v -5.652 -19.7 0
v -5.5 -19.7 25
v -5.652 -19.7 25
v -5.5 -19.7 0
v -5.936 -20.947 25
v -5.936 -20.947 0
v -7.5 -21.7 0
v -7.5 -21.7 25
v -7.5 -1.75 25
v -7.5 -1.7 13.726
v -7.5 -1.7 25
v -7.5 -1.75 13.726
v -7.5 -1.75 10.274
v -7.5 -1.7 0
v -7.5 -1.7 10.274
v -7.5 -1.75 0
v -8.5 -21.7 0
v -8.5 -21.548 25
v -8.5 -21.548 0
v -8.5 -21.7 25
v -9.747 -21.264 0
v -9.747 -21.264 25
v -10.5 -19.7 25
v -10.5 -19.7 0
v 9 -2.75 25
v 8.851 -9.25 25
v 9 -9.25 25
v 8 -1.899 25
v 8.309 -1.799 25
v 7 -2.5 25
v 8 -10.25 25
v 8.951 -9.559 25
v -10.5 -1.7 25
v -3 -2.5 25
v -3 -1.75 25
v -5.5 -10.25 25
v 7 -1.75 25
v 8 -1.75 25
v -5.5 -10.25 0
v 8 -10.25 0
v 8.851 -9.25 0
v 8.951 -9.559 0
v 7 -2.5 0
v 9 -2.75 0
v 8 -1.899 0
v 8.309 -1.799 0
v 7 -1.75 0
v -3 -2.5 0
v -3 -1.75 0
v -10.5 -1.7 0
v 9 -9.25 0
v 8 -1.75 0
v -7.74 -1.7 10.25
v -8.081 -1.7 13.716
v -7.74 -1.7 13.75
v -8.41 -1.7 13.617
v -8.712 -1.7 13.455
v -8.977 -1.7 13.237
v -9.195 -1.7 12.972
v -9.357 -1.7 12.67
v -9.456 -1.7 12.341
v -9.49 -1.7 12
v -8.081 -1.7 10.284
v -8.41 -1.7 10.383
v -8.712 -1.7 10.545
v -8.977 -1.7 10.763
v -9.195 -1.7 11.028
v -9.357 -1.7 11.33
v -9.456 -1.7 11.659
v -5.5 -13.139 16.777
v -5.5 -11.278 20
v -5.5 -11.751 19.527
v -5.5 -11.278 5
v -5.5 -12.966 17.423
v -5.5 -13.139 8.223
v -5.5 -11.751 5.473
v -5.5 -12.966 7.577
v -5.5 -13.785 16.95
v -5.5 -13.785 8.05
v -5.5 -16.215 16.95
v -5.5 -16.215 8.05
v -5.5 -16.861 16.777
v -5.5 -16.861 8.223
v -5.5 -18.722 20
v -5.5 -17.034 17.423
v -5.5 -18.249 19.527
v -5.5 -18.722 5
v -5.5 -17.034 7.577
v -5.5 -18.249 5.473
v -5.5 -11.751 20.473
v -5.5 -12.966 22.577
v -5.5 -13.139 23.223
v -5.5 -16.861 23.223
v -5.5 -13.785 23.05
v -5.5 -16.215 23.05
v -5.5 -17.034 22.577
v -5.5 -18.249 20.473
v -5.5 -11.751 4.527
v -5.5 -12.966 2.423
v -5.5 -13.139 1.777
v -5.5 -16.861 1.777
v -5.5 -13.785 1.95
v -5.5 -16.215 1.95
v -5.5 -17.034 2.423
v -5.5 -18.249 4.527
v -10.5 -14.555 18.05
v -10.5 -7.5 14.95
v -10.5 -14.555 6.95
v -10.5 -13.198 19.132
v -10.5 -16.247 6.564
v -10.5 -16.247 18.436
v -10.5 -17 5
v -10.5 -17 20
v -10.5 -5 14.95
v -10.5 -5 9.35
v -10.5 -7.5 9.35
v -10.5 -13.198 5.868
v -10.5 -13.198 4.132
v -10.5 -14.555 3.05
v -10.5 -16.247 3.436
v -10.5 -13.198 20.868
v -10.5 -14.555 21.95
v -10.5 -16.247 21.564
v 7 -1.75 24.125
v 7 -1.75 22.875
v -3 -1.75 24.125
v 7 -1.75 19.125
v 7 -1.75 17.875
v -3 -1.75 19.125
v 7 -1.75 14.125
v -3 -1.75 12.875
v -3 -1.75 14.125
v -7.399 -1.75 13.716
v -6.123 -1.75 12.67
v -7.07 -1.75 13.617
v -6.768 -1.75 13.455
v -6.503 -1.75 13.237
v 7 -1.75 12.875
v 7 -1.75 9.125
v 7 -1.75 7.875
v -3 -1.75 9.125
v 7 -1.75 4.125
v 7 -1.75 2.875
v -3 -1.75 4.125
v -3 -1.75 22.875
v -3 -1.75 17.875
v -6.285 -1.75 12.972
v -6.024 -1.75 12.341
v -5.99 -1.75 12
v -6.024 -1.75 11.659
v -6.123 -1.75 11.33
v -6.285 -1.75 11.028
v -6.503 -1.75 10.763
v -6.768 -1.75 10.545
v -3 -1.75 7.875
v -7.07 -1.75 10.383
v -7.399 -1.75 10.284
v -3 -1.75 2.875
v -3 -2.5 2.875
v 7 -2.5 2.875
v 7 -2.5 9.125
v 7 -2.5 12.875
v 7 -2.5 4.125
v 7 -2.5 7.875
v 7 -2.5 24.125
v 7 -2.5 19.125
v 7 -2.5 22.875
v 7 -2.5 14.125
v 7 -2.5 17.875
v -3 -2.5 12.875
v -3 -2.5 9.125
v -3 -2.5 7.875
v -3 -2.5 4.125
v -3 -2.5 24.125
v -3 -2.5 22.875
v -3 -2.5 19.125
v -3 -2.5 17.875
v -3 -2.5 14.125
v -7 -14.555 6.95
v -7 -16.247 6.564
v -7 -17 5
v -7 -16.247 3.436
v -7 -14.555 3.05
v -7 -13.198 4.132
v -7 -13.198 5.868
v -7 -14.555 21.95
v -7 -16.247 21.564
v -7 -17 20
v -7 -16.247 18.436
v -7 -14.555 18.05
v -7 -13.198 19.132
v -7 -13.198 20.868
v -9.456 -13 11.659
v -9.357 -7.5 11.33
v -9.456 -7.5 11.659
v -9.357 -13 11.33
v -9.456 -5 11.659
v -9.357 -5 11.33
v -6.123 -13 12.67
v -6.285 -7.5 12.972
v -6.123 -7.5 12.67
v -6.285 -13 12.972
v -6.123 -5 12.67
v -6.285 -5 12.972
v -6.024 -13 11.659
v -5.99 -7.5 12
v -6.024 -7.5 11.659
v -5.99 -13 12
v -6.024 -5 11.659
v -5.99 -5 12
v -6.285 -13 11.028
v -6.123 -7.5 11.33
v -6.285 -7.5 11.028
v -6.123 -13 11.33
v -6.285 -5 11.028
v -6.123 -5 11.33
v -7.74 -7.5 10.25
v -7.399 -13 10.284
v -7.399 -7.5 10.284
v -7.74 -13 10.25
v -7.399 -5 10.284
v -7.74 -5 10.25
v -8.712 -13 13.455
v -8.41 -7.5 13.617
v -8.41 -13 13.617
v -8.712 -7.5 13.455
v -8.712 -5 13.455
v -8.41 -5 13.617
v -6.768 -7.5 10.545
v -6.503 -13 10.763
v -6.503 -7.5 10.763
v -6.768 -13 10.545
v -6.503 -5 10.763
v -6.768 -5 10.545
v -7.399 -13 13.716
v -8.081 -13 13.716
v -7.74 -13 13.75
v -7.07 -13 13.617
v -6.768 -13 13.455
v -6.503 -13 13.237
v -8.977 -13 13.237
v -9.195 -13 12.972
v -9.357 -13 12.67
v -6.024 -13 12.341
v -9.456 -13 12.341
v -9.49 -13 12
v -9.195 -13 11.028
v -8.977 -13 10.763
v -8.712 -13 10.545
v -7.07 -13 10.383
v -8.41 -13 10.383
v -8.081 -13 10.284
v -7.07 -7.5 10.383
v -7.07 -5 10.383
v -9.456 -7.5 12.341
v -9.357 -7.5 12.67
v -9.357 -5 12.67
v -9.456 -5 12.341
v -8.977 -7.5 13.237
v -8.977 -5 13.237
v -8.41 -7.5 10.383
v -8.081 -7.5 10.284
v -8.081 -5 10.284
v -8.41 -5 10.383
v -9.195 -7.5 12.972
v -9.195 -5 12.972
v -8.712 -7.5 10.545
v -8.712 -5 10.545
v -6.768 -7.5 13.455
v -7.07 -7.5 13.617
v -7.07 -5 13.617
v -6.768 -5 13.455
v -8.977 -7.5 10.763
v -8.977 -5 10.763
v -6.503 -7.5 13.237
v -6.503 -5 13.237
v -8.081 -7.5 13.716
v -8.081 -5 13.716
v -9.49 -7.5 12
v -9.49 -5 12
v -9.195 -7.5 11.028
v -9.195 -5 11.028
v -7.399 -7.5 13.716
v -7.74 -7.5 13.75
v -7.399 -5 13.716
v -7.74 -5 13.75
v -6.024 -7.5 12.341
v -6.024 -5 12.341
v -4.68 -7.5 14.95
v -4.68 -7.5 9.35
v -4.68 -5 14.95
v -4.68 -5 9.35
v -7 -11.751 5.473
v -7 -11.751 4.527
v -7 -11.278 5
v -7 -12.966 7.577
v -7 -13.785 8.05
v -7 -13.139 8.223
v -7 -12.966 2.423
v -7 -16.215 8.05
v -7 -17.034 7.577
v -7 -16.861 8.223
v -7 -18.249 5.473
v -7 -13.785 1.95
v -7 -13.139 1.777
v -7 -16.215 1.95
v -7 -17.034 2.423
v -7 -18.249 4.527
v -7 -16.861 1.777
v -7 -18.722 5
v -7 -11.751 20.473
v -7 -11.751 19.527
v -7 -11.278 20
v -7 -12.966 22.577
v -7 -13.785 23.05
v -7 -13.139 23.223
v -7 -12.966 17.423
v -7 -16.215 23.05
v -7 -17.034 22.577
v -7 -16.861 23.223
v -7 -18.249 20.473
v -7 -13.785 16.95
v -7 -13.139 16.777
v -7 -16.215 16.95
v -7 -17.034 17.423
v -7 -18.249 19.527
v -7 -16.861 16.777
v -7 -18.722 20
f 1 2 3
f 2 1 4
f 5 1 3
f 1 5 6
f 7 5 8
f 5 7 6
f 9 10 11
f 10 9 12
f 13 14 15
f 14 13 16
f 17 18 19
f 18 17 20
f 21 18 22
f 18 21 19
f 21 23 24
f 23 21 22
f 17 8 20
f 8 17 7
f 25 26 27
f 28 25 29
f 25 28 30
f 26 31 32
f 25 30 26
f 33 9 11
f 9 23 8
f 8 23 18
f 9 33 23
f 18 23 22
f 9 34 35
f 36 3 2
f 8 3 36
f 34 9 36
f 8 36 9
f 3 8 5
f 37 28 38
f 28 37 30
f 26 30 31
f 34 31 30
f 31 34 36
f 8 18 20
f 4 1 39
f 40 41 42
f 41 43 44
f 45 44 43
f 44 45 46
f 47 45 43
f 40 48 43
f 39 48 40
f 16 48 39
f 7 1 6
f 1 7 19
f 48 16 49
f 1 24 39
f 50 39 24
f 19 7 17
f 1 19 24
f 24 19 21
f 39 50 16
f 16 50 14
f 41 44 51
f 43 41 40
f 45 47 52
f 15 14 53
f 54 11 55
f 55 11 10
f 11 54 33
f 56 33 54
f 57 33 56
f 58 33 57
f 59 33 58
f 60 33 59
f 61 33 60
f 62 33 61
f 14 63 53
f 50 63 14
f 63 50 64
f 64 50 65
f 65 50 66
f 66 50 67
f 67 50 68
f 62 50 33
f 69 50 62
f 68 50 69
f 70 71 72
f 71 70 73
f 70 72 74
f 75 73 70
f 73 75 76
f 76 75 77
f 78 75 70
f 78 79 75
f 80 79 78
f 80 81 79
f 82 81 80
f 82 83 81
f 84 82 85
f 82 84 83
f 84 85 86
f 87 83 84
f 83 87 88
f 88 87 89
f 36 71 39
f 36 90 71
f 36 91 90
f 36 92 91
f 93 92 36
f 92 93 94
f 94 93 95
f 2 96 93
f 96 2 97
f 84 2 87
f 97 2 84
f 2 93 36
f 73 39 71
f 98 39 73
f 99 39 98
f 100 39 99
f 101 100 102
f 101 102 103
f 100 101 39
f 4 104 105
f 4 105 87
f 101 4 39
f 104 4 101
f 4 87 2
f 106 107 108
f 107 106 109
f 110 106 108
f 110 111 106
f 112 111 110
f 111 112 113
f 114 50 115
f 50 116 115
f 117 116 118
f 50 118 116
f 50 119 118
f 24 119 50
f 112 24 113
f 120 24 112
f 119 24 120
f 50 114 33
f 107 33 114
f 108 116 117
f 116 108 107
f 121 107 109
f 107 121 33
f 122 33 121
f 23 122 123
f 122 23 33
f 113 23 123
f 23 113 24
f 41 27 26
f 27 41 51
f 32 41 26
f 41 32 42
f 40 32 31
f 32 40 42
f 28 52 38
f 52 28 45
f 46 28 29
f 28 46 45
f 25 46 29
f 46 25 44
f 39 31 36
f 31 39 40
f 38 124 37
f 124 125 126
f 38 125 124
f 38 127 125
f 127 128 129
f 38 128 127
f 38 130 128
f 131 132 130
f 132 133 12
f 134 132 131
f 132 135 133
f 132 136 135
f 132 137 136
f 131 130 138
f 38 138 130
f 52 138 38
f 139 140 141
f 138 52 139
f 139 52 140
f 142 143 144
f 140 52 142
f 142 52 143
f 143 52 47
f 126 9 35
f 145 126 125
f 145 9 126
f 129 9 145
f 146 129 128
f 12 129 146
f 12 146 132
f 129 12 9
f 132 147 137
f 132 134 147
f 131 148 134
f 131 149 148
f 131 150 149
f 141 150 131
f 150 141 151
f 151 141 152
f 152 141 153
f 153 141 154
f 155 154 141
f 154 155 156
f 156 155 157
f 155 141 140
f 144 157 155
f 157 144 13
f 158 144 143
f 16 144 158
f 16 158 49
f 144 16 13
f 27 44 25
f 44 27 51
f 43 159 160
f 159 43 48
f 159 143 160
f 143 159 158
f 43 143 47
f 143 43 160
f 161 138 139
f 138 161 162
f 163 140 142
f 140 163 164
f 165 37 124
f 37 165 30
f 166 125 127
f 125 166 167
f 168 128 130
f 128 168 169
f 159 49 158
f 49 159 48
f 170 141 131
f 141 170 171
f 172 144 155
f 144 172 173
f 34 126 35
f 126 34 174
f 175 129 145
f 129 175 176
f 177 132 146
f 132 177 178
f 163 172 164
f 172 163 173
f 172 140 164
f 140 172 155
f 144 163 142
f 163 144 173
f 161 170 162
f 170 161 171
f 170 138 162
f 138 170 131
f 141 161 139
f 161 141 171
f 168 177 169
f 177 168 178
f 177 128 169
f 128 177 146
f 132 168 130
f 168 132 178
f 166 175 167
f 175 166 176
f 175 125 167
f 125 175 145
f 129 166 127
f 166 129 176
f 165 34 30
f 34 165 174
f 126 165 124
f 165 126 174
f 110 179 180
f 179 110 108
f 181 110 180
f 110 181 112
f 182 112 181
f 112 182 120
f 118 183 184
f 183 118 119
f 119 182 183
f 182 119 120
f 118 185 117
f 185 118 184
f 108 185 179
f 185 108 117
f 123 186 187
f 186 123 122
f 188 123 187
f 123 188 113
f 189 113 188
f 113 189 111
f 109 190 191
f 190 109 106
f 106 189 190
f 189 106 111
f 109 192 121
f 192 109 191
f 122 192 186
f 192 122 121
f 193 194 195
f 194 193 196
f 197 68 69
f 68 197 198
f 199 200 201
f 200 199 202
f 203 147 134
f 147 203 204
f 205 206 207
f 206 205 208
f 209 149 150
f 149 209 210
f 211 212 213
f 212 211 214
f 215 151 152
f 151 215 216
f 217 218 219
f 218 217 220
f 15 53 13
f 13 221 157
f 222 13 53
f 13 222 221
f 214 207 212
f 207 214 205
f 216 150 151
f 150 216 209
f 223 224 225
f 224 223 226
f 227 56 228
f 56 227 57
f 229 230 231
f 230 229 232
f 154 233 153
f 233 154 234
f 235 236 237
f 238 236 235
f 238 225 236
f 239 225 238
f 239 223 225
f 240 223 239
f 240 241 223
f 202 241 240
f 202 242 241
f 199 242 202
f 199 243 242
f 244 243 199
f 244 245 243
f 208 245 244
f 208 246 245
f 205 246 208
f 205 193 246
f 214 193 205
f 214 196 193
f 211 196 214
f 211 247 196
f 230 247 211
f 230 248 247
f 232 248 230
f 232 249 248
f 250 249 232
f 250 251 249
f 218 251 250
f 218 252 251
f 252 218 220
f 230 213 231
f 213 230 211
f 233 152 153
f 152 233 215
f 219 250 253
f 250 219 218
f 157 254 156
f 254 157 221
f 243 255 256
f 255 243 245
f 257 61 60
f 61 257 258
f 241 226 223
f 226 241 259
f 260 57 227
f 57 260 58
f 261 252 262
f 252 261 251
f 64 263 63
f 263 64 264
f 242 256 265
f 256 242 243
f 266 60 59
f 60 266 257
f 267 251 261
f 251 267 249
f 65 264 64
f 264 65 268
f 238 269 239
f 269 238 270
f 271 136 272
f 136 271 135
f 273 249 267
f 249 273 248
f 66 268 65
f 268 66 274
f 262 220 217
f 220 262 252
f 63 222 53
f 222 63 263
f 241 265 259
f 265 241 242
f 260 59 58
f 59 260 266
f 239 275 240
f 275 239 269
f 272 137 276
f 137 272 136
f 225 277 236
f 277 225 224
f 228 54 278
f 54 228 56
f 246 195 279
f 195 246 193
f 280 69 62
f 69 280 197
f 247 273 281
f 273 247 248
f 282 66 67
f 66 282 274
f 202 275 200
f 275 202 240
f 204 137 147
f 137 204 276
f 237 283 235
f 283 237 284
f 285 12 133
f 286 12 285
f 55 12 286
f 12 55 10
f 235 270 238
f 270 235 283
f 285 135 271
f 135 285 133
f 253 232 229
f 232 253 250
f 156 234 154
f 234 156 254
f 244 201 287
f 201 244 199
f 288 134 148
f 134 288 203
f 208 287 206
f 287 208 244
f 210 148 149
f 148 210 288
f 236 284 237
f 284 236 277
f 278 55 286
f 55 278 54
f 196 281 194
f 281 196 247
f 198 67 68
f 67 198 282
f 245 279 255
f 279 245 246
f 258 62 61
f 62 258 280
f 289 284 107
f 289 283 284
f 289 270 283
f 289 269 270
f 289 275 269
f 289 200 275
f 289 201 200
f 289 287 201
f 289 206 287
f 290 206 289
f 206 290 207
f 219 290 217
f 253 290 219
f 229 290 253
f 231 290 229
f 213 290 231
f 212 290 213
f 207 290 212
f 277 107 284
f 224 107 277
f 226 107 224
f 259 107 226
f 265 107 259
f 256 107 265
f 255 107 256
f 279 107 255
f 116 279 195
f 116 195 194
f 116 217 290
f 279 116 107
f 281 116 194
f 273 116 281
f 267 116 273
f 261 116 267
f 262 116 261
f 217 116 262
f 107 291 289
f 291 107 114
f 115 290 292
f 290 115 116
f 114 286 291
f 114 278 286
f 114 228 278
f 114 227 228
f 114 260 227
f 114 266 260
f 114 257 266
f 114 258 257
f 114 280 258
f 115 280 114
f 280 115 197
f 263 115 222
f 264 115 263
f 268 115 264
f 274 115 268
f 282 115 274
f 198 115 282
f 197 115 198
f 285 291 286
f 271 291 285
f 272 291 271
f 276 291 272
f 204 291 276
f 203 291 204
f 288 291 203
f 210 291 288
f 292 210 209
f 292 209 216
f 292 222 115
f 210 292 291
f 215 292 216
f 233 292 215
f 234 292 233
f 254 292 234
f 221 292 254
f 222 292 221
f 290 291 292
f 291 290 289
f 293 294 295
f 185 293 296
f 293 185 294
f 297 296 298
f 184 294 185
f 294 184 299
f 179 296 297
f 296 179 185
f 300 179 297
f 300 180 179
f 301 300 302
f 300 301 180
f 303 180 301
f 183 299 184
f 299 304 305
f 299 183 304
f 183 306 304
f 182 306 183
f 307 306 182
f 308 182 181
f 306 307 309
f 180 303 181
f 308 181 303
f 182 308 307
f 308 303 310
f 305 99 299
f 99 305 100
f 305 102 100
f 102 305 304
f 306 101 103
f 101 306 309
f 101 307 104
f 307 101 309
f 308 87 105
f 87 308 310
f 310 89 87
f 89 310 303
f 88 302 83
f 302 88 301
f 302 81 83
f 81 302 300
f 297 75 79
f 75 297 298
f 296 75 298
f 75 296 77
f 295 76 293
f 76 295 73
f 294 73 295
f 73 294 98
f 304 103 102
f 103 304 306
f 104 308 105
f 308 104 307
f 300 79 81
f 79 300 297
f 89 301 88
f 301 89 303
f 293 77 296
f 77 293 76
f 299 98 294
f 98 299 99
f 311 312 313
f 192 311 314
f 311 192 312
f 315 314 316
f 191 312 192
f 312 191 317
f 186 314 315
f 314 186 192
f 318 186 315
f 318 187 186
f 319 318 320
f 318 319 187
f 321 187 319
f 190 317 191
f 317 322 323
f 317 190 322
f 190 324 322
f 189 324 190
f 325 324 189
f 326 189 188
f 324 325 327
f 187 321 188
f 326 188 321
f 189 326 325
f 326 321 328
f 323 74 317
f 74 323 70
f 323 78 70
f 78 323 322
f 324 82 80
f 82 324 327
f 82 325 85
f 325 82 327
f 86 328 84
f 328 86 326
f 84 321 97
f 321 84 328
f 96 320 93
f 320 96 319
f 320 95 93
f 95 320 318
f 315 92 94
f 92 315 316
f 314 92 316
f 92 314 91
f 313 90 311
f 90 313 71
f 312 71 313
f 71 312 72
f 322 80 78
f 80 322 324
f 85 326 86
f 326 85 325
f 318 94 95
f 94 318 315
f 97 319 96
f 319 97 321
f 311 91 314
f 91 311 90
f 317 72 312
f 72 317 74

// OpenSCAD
// file: inc/functions.scad
// PRUSA iteration3
// Functions used in many files
// GNU GPL v3
// Josef Průša <josefprusa@me.com>
// Václav 'ax' Hůla <axtheb@gmail.com>
// Vlnofka <>
// http://www.reprap.org/wiki/Prusa_Mendel
// http://github.com/prusajr/PrusaMendel

module roundcorner(diameter){
	difference(){
		cube(size = [diameter,diameter,99], center = false);
		translate(v = [diameter, diameter, 0]) cylinder(h = 100, r=diameter, center=true);
	}
}
module nut(d,h,horizontal=true){
    cornerdiameter =  (d / 2) / cos (180 / 6);
    cylinder(h = h, r = cornerdiameter, $fn = 6);
    if(horizontal){
        for(i = [1:6]){
            rotate([0,0,60*i]) translate([-cornerdiameter-0.2,0,0]) rotate([0,0,-45]) cube([2,2,h]);
        }
    }
}

// Based on nophead research
module polyhole(d, h, center=false) {
    n = max(round(2 * d),3);
    rotate([0,0,180])
        cylinder(h = h, r = (d / 2) / cos (180 / n), $fn = n);
}

// make it interchangeable between this and cylinder
module cylinder_poly(r, h, center=false){
    polyhole(d=r*2, h=h, center=center);
}

module fillet(radius, height=100, $fn=0) {
    //this creates acutal fillet
    translate([-radius, -radius, -height/2-0.01])
        difference() {
            cube([radius*2, radius*2, height+0.02]);
            cylinder(r=radius, h=height+0.02, $fn=$fn);
        }
}

module cube_fillet(size, radius=-1, vertical=[3,3,3,3], top=[0,0,0,0], bottom=[0,0,0,0], center=false, $fn=0){
    //
    if (center) {
        cube_fillet_inside(size, radius, vertical, top, bottom, $fn);
    } else {
        translate([size[0]/2, size[1]/2, size[2]/2])
            cube_fillet_inside(size, radius, vertical, top, bottom, $fn);
    }
}

module cube_negative_fillet(size, radius=-1, vertical=[3,3,3,3], top=[0,0,0,0], bottom=[0,0,0,0], $fn=0){

    j=[1,0,1,0];

    for (i=[0:3]) {
        if (radius > -1) {
            rotate([0, 0, 90*i]) translate([size[1-j[i]]/2, size[j[i]]/2, 0]) fillet(radius, size[2], $fn=$fn);
        } else {
            rotate([0, 0, 90*i]) translate([size[1-j[i]]/2, size[j[i]]/2, 0]) fillet(vertical[i], size[2], $fn=$fn);
        }
        rotate([90*i, -90, 0]) translate([size[2]/2, size[j[i]]/2, 0 ]) fillet(top[i], size[1-j[i]], $fn=$fn);
        rotate([90*(4-i), 90, 0]) translate([size[2]/2, size[j[i]]/2, 0]) fillet(bottom[i], size[1-j[i]], $fn=$fn);

    }
}

module cube_fillet_inside(size, radius=-1, vertical=[3,3,3,3], top=[0,0,0,0], bottom=[0,0,0,0], $fn=0){
    //makes CENTERED cube with round corners
    // if you give it radius, it will fillet vertical corners.
    //othervise use vertical, top, bottom arrays
    //when viewed from top, it starts in upper right corner (+x,+y quadrant) , goes counterclockwise
    //top/bottom fillet starts in direction of Y axis and goes CCW too


    if (radius == 0) {
        cube(size, center=true);
    } else {
        difference() {
            cube(size, center=true);
            cube_negative_fillet(size, radius, vertical, top, bottom, $fn);
        }
    }
}


module nema17(places=[1,1,1,1], size=15.5, h=10, holes=false, shadow=false, $fn=24){
    for (i=[0:3]) {
        if (places[i] == 1) {
            rotate([0, 0, 90*i]) translate([size, size, 0]) {
                if (holes) {
                    #rotate([0, 0, -90*i])  translate([0,0,-10]) screw(r=1.7, slant=false, head_drop=13, $fn=$fn, h=h+12);
                } else {
                    rotate([0, 0, -90*i]) cylinder(h=h, r=5.5, $fn=$fn);
                }
            }
        }
    }
    if (shadow != false) {
        %translate ([0, 0, shadow+21+3]) cube([42,42,42], center = true);
    //flange
        %translate ([0, 0, shadow+21+3-21-1]) cylinder(r=11,h=2, center = true, $fn=20);
    //shaft
        %translate ([0, 0, shadow+21+3-21-7]) cylinder(r=2.5,h=14, center = true);
    }
}

module screw(h=20, r=2, r_head=3.5, head_drop=0, slant=true, poly=false, $fn=0){
    //makes screw with head
    //for substraction as screw hole
    if (poly) {
        cylinder_poly(h=h, r=r, $fn=$fn);
    } else {
        cylinder(h=h, r=r, $fn=$fn);
    }
    if (slant) {
        translate([0, 0, head_drop-0.01]) cylinder(h=r_head, r2=0, r1=r_head, $fn=$fn);
    }

    if (head_drop > 0) {
        translate([0, 0, -0.01]) cylinder(h=head_drop+0.01, r=r_head, $fn=$fn);
    }
}
module screw_cylinder(r_head=5.25,r=3.25,head_drop=6.2,slant=false){
	screw(r_head=r_head,head_drop=head_drop,r=r, slant=slant);

}

//screw_cylinder();
//cube_fillet([10,20,30], vertical=[3,2,0,0], top=[3,2,0,5], bottom=[3,2,0,5]);
//cube_fillet([10,20,30], radius=2, top=[7,2,7,2]);
// file: inc/metric.scad
// PRUSA iteration3
// Default metric sizes
// GNU GPL v3
// Josef Průša <josefprusa@me.com>
// http://www.reprap.org/wiki/Prusa_Mendel
// http://github.com/prusajr/PrusaMendel

// DONT CHANGE THIS FILE! ALTER VALUES IN CONFIGURATION.SCAD INSTEAD

// RODS

threaded_rod_diameter = 8.7;
threaded_rod_diameter_horizontal = 8.7;
smooth_bar_diameter = 8;
smooth_bar_diameter_horizontal = 8.8;

// Nuts and bolts

m8_diameter = 9;
m8_nut_diameter = 14.1;

m4_diameter = 4.5;
m4_nut_diameter = 9;

m3_diameter = 3.6;
m3_nut_diameter = 5.3;
m3_nut_diameter_horizontal = 6.1;

// Bushing holder

bushing_core_diameter = smooth_bar_diameter;
bushing_material_thickness = 1;

// Motors

motor_shaft = 5.5;
// file: configuration.scad
// PRUSA iteration3
// Configuration file
// GNU GPL v3
// Josef Průša <josefprusa@me.com>
// Václav 'ax' Hůla <axtheb@gmail.com>
// http://www.reprap.org/wiki/Prusa_Mendel
// http://github.com/prusajr/PrusaMendel

// PLEASE SELECT ONE OF THE CONFIGURATIONS BELOW
// BY UN-COMMENTING IT

// Uncomment for metric settings
// METRIC METRIC METRIC METRIC METRIC METRIC METRIC METRIC 

include <inc/metric.scad>;

// Custom settings here, tailor to your supplies and print settings

// Select your belt type ******************************************************

//T2.5
//belt_tooth_distance = 2.5;
//belt_tooth_ratio = 0.5;

//T5 (strongly discouraged)
belt_tooth_distance = 5;
belt_tooth_ratio = 0.75;

//HTD3
//belt_tooth_distance = 3;
//belt_tooth_ratio = 0.75;

//MXL
//belt_tooth_distance = 2.032;
//belt_tooth_ratio = 0.64;

// Choose bearing/bushing configuration ***************************************

//Choose from:

// 0 = Z as lm[e]8uu, X and Y bushings
// 1 = all bushings
// 2 = all bearings [default. Do not change unless you really know what you are doing]
// DO NOT OFFER 0 or 1 VARIANTS FOR SALE. We really mean that. In the long run it hurts everyone.

bearing_choice = 2;

// Bushing version
// 0 = square igus housings. By igus we mean JFM-0810-10 or GFM-0810-10
// 1 = round igus (works better if printed precisely)
// 2 = bronze self-aligning bushings
bushing_type = 0;

//Bearing version
// 0 = default lm8uu
// 1 = lme8uu
bearing_type = 0;

// Select idler bearing size **************************************************

// 0 = 608 [standard skate bearings]
// 1 = 624 [roughly same diameter as pulley, makes belt parallel so its prettier]

idler_bearing = 0;

// Thickness of the XZ plate board
board_thickness = 12;

//Layer height * width over thickness. Used for idler sleeve
single_wall_width = 0.3*2.2;

// END of custom settings


// You are not supposed to change this
board_to_xz_distance = 26;
xaxis_rod_distance = 45;
carriage_l = 74;
carriage_hole_to_side = 5;
carriage_hole_height = 4;

//calculated from settings

idler_size = (idler_bearing == 0) ? 22 : 13;

//use 4.5 for 608, 2.5 for 624
idler_size_inner_r = (idler_bearing == 0) ? 4.5 : 2.5;

idler_width = (idler_bearing == 0) ? 9 : 5;

// CHANGE ONLY THE STUFF YOU KNOW
// IT WILL REPLACE DEFAULT SETTING

// RODS

// threaded_rod_diameter = 0;
// threaded_rod_diameter_horizontal = 0;
// smooth_bar_diameter = 0;
// smooth_bar_diameter_horizontal = 0;

// Nuts and bolts

// m8_diameter = 0;
// m8_nut_diameter = 0;

// m4_diameter = 0;
// m4_nut_diameter = 0;

// m3_diameter = 0;
// m3_nut_diameter = 0;

// Bushing holder

// bushing_core_diameter = smooth_bar_diameter;
// bushing_material_thickness = 0;

///counted stuff
m3_nut_diameter_bigger = ((m3_nut_diameter  / 2) / cos (180 / 6))*2;

// functions
include <inc/functions.scad>


// These constants define the geometry of the complete-printer.scad

//x_smooth_rod_length=325;
//y_smooth_rod_length=405;
//z_smooth_rod_length=235;
bed_x_size=225;
bed_y_size=225;

x_smooth_rod_length=450+board_thickness*2+10; // 492 for 16mm thickness; 484 for 12mm thickness
y_smooth_rod_length=470;
z_smooth_rod_length=405;  
bed_x_size=225;
bed_y_size=225;
// main file
// PRUSA iteration3
// Y belt holder
// GNU GPL v3
// Josef Průša <josefprusa@me.com>
// Václav 'ax' Hůla <axtheb@gmail.com>
// http://www.reprap.org/wiki/Prusa_Mendel
// http://github.com/prusajr/PrusaMendel

include <configuration.scad>

y_belt_holder();
//rotate([0,90,0])beltholder_nuts();
//translate([7,6,-2])rotate([90,-90,0])y_beltclamp();


module y_belt_holder(){
translate([0, -10, 0])rotate([0,0,-90]){
	difference(){
    	union(){
    
    		translate([1.7, -8, 12.5]) cube_fillet([20, 5, 25],vertical = [2,2,0,2], center = true);

    		difference(){        	
            translate([-4.0, 0, 12.5]) cube_fillet([8.5, 18, 25], center = true, vertical = [1,1,0,0], fn=8);        
        		       
        
        		translate([0,2,0])intersection() {
            	for (i = [0 : 35/belt_tooth_distance])
            	{
                	translate([-9.0, 0, 1+i*belt_tooth_distance]) cube([3, 10, belt_tooth_distance*belt_tooth_ratio], center = true);
            	}
            	translate([0, 0, 35/2]) cube([20, 10, 35], center = true);
        		}

    		}
		}

		translate([5, -4, 5]) rotate([90, 0, 0]) screw();
		translate([5, -4, 20]) rotate([90, 0, 0]) screw();
		translate([-5,-10.8,12])belt_clamp_nut();
		translate([5,-4.5,5])rotate([90,0,0])nut(d=m3_nut_diameter_horizontal,h=2.5);
		translate([5,-4.5,20])rotate([90,0,0])nut(d=m3_nut_diameter_horizontal,h=2.5);

	}
	
}
}

module beltholder_nuts(){
	translate([-14, 0, 17.5])rotate([0,0,-90]) {
		difference(){
			cube_fillet([40, 4, 35], center = true,vertical = [0,0,2,2],top=[0,0,2,0],bottom=[0,0,2,0], fn=8);
			translate([-15, 10, -10]) rotate([90, 0, 0]) cylinder(r=m3_diameter/2,h=20);
			translate([-15, 0, -10]) rotate([90,0,0])nut(d=m3_nut_diameter_horizontal,h=2.5);

			translate([-15, 10, 10]) rotate([90, 0, 0]) cylinder(r=m3_diameter/2,h=20);
			translate([-15, 0, 10])rotate([90,0,0])nut(d=m3_nut_diameter_horizontal,h=2.5);

			translate([15, 10, -10]) rotate([90, 0, 0]) cylinder(r=m3_diameter/2,h=20);
			translate([15, 0, -10])rotate([90,0,0])nut(d=m3_nut_diameter_horizontal,h=2.5);

			translate([15, 10, 10]) rotate([90, 0, 0]) cylinder(r=m3_diameter/2,h=20);
			translate([15, 0, 10])rotate([90,0,0])nut(d=m3_nut_diameter_horizontal,h=2.5);

			translate([0, 5, 0])rotate([90,0,0])cylinder(r=10,h=10);
			
		}
		
	}

}

module y_beltclamp(){
    translate([2,0,0]) difference(){
        cube_fillet([24,17,7]);
        translate([24,m3_nut_diameter_bigger,0]/2){
            cylinder(r=3.4/2,h=30);
            translate([0,0,7]) mirror([0,0,1]) screw(slant=false,r=1.7,head_drop=3);

        }
    }
}
module belt_clamp_nut() {
    #translate([0,0,m3_nut_diameter/-2]) cube([2.5,m3_nut_diameter_bigger,m3_nut_diameter+0.3]);
    translate([0,m3_nut_diameter_bigger/2,0]){
        #translate([-2,0,0])rotate([0, 90,0]) cylinder(r=3.5/2,h=10,$fn=32);
        rotate([0,-90,0]) cylinder(r=3.5/2,h=20,$fn=32);
    }
}
